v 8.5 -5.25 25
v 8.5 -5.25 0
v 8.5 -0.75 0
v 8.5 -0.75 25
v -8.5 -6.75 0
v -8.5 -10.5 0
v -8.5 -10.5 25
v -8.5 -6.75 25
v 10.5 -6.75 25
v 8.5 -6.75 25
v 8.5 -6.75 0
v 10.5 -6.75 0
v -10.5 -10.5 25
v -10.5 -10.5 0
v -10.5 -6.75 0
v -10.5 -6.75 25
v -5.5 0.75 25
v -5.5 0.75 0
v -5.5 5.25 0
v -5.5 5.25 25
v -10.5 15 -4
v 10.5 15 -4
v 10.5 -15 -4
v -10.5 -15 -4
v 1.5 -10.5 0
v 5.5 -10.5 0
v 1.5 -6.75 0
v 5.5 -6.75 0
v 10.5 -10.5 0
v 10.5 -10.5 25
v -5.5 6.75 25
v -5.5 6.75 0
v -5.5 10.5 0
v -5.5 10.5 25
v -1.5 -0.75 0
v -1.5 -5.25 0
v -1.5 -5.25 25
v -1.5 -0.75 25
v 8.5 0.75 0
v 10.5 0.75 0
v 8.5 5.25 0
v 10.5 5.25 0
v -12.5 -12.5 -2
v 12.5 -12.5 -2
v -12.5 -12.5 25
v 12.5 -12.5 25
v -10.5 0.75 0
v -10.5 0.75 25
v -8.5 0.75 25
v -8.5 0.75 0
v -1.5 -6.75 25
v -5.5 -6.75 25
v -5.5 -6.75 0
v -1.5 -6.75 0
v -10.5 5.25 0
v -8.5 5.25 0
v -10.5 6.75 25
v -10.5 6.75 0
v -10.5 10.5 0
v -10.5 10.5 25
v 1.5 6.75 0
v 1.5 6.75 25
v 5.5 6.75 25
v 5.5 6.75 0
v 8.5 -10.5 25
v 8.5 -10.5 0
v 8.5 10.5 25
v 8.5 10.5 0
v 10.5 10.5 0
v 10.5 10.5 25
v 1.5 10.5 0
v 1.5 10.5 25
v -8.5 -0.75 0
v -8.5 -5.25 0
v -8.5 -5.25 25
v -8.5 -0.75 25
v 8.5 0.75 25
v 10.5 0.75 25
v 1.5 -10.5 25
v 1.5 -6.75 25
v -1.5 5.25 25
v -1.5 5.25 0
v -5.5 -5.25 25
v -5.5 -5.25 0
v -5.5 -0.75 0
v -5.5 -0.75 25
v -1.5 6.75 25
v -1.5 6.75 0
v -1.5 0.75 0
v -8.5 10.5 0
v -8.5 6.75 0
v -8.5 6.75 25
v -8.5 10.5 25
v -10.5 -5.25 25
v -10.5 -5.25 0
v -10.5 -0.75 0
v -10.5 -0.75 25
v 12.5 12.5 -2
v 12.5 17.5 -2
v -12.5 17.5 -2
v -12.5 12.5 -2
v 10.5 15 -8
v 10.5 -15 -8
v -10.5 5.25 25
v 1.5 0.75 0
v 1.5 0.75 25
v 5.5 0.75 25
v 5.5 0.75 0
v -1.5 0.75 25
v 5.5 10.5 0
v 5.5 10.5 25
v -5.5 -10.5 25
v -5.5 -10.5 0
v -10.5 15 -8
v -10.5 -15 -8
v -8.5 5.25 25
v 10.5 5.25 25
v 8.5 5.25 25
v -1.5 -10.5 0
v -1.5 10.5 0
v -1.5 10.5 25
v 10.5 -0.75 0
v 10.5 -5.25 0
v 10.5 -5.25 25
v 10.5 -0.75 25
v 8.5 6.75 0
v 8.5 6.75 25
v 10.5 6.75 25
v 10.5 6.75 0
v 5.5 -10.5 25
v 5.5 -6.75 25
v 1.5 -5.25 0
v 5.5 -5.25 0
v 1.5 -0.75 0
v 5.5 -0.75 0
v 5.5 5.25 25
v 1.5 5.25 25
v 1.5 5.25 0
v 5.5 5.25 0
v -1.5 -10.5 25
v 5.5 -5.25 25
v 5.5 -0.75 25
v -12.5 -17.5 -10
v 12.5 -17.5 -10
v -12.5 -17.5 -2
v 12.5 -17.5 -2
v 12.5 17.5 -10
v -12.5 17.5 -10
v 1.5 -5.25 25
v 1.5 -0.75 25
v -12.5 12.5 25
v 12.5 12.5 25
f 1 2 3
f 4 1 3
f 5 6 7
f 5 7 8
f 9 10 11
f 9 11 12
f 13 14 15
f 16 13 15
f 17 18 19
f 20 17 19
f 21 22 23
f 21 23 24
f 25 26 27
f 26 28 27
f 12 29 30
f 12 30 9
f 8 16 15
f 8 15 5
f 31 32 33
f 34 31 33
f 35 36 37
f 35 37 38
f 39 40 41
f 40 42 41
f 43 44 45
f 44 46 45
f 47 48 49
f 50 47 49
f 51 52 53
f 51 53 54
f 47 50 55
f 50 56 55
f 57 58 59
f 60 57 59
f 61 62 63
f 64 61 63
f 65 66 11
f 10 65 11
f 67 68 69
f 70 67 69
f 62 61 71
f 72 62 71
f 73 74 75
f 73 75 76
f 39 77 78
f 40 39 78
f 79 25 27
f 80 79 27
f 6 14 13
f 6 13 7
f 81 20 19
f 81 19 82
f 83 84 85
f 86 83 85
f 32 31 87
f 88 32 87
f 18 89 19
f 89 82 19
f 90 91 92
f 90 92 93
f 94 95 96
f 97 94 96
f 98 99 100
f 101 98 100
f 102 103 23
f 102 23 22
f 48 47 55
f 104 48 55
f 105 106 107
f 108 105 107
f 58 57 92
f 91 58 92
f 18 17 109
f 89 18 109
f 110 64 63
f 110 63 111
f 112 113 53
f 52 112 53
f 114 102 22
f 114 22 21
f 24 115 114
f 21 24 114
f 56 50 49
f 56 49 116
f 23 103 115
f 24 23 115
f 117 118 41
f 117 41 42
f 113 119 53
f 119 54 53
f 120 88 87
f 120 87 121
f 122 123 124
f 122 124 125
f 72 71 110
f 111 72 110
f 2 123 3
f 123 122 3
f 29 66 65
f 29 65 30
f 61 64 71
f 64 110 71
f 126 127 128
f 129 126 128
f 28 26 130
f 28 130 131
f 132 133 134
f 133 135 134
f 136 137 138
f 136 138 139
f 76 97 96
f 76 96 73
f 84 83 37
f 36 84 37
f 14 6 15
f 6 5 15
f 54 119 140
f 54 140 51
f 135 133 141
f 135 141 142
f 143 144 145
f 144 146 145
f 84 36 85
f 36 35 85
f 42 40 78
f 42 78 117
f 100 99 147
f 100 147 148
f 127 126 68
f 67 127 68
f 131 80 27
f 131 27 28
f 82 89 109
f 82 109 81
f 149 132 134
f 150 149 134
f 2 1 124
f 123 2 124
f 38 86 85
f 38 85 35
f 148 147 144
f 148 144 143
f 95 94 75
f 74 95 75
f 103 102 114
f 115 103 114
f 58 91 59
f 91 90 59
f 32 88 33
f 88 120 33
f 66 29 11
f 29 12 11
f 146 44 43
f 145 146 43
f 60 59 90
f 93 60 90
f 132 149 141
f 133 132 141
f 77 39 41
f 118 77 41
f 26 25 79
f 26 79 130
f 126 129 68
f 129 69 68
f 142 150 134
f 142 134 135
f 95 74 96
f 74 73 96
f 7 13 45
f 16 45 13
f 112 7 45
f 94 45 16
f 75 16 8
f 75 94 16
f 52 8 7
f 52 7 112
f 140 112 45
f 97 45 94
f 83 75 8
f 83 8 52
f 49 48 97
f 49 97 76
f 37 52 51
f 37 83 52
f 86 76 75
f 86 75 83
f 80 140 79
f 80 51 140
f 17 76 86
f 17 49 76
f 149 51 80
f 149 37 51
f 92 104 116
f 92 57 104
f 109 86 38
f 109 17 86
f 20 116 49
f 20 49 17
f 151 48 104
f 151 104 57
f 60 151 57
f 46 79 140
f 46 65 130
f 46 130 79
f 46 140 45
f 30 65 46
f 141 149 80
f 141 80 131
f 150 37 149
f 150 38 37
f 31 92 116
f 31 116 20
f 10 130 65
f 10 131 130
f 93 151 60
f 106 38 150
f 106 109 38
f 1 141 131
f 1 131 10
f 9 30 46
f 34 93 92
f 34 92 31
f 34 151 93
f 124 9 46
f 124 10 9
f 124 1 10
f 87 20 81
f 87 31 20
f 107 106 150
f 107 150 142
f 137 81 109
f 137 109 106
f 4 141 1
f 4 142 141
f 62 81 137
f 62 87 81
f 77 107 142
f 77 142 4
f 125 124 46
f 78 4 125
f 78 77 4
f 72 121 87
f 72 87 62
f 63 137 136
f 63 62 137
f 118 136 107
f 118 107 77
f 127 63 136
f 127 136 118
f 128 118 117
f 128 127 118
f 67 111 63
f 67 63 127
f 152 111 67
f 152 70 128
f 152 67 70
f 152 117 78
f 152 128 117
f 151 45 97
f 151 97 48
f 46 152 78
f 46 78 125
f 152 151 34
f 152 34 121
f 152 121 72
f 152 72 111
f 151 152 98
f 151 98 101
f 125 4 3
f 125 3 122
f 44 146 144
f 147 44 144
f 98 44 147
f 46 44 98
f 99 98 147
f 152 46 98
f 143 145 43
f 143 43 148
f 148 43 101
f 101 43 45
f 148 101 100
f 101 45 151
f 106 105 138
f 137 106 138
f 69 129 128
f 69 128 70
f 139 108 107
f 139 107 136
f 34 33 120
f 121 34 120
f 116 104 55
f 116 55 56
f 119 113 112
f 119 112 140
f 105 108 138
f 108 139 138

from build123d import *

# Parameters (mm, degrees)
SKETCH_8_W          = 25
SKETCH_8_H          = 25
SKETCH_8_W_2        = 4
SKETCH_8_H_2        = 21
SKETCH_8_W_3        = 2
EXTRUDE_7_DEPTH     = 25
SKETCH_9_W          = 25
SKETCH_9_H          = 25
EXTRUDE_8_DEPTH     = 2
SKETCH_11_W         = 25
SKETCH_11_H         = 35
EXTRUDE_9_DEPTH     = 6
SKETCH_12_W         = 21
SKETCH_12_H         = 30
CUT_EXTRUDE_1_DEPTH = 4
SKETCH_14_W         = 25
SKETCH_14_H         = 1.5
EXTRUDE_11_DEPTH    = 25
SKETCH_15_W         = 25
SKETCH_15_H         = 35
EXTRUDE_12_DEPTH    = 2


with BuildPart() as part:
    # 草图8 → 凸台-拉伸7 (new body)
    with BuildSketch(Plane.XY):
        Rectangle(SKETCH_8_W, SKETCH_8_H)
        with Locations((3.5, 0)):
            Rectangle(SKETCH_8_W_2, SKETCH_8_H_2, mode=Mode.SUBTRACT)
        with Locations((-3.5, 0)):
            Rectangle(SKETCH_8_W_2, SKETCH_8_H_2, mode=Mode.SUBTRACT)
        with Locations((-9.5, 0)):
            Rectangle(SKETCH_8_W_3, SKETCH_8_H_2, mode=Mode.SUBTRACT)
        with Locations((9.5, 0)):
            Rectangle(SKETCH_8_W_3, SKETCH_8_H_2, mode=Mode.SUBTRACT)
    extrude(amount=EXTRUDE_7_DEPTH)

    # 草图9 → 凸台-拉伸8 (add)
    with BuildSketch(Plane(origin=(0, 0, 0), x_dir=(-1, 0, 0), z_dir=(0, 0, -1))):
        Rectangle(SKETCH_9_W, SKETCH_9_H)
    extrude(amount=EXTRUDE_8_DEPTH)

    # 草图11 → 凸台-拉伸9 (add)
    with BuildSketch(Plane(origin=(0, 0, -2), x_dir=(-1, 0, 0), z_dir=(0, 0, -1))):
        Rectangle(SKETCH_11_W, SKETCH_11_H)
    extrude(amount=EXTRUDE_9_DEPTH)

    # 草图12 → 切除-拉伸1 (cut)
    with BuildSketch(Plane(origin=(0, 0, -8), x_dir=(-1, 0, 0), z_dir=(0, 0, -1))):
        Rectangle(SKETCH_12_W, SKETCH_12_H)
    extrude(amount=-CUT_EXTRUDE_1_DEPTH, mode=Mode.SUBTRACT)

    # 草图14 → 凸台-拉伸11 (add)
    with BuildSketch(Plane.XY.offset(25)):
        Rectangle(SKETCH_14_W, SKETCH_14_H)
        with Locations((0, 6)):
            Rectangle(SKETCH_14_W, SKETCH_14_H)
        with Locations((0, -6)):
            Rectangle(SKETCH_14_W, SKETCH_14_H)
    extrude(amount=-EXTRUDE_11_DEPTH)

    # 草图15 → 凸台-拉伸12 (add)
    with BuildSketch(Plane(origin=(0, 0, -8), x_dir=(-1, 0, 0), z_dir=(0, 0, -1))):
        Rectangle(SKETCH_15_W, SKETCH_15_H)
    extrude(amount=EXTRUDE_12_DEPTH)


solid = part.part
